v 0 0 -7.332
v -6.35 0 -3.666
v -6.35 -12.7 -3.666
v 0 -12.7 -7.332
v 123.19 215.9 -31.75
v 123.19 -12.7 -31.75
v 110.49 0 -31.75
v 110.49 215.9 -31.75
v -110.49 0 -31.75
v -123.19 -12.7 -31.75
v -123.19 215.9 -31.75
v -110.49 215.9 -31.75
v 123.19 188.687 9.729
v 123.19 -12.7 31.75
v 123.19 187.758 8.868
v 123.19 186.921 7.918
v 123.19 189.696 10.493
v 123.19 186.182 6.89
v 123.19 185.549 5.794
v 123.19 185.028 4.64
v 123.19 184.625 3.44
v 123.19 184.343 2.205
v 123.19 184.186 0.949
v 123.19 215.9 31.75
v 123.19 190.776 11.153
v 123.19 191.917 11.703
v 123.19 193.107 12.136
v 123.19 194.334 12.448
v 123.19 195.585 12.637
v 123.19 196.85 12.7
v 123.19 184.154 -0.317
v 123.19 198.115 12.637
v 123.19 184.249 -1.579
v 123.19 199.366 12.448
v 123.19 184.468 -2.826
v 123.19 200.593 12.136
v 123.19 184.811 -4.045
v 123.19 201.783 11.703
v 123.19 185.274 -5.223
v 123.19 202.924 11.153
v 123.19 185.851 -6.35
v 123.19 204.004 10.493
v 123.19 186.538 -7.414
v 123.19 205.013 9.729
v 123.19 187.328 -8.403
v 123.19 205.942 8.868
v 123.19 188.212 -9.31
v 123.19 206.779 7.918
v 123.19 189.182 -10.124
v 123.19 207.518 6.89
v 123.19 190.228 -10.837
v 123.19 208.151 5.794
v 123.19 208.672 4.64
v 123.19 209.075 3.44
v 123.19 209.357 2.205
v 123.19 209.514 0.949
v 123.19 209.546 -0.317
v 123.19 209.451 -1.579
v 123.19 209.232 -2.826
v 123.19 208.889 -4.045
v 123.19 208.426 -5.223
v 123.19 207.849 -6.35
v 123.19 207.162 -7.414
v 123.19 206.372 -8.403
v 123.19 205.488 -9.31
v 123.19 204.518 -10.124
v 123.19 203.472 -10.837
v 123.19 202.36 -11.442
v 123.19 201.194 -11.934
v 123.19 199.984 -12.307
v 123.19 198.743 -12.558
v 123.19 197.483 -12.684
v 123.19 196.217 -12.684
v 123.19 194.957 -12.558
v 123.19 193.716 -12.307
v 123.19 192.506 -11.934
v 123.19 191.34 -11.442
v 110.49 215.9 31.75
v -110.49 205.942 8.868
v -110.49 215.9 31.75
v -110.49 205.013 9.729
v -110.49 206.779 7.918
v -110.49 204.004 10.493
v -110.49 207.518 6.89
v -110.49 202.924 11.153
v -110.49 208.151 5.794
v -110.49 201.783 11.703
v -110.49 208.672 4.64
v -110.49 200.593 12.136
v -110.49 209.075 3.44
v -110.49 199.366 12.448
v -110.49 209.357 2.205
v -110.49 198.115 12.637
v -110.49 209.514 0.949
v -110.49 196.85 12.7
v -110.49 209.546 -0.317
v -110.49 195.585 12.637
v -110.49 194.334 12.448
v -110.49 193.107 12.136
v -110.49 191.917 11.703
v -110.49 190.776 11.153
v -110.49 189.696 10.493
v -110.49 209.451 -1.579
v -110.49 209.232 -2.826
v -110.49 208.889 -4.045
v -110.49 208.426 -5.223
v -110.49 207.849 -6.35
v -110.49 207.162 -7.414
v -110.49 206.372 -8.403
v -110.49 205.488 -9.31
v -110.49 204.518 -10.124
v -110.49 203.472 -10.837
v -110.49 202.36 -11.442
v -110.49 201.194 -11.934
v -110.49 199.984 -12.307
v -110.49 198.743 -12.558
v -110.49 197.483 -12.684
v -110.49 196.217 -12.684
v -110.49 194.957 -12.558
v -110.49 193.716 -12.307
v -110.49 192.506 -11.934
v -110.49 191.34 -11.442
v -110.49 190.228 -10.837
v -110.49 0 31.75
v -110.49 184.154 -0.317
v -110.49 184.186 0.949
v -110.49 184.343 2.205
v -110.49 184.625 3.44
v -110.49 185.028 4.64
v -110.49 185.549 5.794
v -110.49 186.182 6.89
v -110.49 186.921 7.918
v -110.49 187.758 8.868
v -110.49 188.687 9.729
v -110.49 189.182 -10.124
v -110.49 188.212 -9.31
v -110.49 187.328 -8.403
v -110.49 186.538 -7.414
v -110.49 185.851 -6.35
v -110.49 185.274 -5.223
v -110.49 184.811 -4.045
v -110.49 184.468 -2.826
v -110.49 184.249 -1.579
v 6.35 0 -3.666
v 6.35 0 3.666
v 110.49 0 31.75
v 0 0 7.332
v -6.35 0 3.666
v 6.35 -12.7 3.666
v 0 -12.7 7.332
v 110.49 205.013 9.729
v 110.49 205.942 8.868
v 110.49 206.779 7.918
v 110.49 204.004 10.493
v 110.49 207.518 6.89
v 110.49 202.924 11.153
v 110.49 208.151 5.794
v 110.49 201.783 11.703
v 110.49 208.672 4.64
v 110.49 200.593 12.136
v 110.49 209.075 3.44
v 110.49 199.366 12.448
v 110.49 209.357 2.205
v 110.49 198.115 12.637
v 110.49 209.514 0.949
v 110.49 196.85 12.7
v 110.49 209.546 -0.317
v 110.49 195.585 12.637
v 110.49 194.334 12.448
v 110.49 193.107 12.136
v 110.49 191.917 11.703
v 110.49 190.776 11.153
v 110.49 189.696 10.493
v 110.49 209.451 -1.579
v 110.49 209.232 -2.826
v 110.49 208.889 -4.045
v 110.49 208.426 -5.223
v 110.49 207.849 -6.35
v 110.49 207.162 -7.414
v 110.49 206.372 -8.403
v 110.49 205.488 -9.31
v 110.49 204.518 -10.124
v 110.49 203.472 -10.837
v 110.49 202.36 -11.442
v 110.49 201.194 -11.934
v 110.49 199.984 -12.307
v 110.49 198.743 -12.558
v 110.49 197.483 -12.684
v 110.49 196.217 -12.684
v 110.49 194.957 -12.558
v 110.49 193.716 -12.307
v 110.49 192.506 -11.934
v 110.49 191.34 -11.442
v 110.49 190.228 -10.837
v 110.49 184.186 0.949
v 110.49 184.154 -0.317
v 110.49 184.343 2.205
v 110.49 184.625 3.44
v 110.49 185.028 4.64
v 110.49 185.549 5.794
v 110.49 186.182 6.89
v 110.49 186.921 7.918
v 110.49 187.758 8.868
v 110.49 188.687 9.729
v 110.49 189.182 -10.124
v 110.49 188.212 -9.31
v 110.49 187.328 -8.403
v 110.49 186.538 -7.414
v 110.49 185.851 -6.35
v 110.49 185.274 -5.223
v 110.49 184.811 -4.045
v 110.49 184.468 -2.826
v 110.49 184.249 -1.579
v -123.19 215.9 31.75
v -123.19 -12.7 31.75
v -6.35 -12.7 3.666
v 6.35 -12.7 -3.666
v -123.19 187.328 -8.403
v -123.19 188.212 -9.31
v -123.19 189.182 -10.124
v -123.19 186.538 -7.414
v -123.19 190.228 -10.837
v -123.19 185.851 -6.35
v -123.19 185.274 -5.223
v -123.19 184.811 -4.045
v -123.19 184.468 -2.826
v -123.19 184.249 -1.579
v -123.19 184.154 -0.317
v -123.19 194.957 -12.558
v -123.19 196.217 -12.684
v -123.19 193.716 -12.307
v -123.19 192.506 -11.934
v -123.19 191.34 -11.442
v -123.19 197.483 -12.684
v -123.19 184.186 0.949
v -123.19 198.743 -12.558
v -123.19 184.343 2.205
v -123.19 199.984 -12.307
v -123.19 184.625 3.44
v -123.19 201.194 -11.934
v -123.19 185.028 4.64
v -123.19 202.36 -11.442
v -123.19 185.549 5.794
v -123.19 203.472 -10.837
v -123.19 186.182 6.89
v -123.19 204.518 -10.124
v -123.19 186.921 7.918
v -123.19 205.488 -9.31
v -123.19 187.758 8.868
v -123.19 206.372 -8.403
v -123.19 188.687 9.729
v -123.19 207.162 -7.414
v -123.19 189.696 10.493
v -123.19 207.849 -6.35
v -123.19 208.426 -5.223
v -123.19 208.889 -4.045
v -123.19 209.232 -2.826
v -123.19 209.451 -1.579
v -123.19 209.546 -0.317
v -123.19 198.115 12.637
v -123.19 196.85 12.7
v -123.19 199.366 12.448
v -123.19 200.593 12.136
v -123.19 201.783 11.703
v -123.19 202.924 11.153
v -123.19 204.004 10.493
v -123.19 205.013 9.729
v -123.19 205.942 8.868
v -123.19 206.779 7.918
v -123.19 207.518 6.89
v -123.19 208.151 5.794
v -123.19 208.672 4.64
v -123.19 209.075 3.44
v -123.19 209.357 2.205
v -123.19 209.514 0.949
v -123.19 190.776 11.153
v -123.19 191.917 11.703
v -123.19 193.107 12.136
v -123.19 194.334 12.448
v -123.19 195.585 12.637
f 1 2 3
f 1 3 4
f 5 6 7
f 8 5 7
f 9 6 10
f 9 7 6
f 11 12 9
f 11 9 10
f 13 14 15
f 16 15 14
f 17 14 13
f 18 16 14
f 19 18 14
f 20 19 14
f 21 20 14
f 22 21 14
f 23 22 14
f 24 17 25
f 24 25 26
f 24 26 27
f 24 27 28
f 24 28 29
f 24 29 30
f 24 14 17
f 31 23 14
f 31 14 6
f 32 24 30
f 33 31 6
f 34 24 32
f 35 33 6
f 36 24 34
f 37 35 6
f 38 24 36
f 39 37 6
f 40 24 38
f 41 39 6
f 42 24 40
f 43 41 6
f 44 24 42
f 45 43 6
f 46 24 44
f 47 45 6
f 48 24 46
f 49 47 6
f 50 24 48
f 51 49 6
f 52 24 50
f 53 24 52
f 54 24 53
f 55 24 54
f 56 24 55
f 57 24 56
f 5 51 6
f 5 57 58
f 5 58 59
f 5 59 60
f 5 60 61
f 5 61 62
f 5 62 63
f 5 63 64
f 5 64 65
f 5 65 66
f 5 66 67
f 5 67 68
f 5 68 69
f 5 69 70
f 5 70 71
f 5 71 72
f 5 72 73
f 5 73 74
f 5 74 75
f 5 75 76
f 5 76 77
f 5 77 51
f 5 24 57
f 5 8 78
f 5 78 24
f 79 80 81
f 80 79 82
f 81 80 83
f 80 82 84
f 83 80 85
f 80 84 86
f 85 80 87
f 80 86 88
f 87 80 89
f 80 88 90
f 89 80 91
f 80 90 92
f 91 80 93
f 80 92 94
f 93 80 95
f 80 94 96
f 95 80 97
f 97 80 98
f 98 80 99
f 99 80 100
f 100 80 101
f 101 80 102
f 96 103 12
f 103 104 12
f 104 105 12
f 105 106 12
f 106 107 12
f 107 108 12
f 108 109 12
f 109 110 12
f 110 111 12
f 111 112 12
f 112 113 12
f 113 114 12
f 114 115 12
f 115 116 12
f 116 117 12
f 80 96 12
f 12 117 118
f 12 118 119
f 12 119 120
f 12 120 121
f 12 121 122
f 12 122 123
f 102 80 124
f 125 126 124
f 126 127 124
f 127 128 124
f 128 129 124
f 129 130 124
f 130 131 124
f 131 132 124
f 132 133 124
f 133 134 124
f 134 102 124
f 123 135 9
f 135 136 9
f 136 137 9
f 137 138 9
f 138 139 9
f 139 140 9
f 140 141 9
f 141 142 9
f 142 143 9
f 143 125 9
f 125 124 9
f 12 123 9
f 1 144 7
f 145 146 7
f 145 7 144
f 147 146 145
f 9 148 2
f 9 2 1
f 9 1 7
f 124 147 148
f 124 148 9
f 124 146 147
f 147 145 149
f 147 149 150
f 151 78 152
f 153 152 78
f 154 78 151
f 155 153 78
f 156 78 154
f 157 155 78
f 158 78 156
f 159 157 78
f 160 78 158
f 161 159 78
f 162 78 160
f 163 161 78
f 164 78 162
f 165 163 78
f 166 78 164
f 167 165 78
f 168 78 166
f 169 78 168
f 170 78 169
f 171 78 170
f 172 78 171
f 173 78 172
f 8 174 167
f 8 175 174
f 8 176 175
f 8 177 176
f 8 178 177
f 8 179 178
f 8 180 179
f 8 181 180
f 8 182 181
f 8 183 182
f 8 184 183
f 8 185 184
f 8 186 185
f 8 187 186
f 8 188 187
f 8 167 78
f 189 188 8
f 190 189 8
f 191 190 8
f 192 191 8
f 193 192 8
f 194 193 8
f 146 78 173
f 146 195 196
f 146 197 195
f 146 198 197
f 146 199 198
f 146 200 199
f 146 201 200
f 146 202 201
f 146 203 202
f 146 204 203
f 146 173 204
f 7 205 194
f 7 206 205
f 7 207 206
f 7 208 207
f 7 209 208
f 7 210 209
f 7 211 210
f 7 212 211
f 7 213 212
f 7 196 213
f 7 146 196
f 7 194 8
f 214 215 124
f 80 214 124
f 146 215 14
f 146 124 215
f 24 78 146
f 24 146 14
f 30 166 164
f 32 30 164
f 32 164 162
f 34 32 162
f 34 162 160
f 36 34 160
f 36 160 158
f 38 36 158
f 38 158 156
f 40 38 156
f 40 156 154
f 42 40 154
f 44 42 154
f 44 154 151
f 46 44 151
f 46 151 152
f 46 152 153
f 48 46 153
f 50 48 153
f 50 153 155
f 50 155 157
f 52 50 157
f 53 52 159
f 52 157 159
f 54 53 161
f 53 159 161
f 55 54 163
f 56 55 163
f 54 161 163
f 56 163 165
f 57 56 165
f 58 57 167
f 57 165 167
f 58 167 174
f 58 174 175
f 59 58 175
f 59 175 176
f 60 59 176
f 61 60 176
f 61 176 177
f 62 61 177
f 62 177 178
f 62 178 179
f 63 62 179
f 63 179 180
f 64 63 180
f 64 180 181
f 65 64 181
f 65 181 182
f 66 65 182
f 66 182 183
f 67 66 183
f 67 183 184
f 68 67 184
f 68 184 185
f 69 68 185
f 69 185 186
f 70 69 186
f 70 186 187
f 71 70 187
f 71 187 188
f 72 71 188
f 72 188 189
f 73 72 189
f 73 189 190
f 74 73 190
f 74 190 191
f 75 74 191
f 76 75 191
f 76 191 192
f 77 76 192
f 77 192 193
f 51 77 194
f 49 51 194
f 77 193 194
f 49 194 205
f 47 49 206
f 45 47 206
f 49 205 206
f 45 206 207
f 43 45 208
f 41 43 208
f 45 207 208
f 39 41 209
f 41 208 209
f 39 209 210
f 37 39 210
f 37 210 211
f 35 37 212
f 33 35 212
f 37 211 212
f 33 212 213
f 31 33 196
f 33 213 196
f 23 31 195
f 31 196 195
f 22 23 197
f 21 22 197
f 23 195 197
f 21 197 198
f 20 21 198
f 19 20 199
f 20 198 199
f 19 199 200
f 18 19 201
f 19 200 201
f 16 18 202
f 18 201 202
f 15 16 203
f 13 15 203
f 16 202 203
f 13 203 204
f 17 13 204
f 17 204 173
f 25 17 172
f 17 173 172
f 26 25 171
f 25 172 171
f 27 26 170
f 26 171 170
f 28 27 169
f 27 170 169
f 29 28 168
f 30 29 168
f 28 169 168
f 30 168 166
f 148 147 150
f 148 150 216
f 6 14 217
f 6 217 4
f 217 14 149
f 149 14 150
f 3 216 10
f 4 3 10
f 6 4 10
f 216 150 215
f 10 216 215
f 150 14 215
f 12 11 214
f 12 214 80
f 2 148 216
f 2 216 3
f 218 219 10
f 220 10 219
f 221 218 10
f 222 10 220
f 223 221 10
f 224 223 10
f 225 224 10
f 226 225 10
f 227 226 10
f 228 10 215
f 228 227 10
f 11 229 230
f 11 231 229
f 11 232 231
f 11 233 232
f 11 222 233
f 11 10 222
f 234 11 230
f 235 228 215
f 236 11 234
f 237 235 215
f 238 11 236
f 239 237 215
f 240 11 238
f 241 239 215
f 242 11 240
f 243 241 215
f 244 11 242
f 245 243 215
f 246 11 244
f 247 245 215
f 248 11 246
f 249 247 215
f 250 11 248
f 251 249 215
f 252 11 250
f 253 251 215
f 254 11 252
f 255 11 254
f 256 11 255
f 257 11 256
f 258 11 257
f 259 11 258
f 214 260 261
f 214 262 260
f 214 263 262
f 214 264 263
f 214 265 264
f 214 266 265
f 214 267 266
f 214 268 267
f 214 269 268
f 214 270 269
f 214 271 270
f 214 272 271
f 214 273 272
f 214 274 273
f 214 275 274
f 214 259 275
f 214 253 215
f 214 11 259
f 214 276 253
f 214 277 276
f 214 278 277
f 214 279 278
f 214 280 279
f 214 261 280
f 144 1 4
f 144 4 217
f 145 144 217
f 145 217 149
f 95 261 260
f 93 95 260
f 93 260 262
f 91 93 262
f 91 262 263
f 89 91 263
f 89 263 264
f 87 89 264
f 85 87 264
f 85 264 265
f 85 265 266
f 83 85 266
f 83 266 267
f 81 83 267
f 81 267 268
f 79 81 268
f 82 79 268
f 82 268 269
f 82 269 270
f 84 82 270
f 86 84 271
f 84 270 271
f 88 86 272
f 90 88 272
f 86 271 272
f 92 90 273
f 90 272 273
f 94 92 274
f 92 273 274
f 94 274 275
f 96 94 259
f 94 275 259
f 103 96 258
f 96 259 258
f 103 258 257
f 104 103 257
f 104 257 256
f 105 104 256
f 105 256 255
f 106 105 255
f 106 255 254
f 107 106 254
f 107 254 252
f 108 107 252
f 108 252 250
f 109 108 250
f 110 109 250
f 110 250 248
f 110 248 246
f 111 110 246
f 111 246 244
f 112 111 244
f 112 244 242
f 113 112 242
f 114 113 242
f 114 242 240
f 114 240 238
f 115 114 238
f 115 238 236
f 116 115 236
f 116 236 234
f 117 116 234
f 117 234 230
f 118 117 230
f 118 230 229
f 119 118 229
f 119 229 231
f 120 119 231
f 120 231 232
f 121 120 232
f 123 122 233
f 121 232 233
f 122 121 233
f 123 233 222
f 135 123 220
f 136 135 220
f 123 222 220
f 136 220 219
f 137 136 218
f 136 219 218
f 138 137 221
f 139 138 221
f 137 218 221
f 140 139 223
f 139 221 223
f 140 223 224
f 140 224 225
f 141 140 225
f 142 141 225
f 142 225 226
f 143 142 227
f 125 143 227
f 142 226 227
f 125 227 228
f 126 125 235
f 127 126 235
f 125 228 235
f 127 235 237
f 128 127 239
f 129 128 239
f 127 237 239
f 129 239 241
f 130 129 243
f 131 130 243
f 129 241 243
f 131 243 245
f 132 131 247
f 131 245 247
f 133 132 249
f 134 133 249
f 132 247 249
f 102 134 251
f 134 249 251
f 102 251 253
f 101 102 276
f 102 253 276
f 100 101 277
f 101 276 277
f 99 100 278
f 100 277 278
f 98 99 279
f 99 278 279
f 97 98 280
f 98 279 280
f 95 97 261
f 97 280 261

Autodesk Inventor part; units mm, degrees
ref_plane "YZ Plane" through (0, 0, 0) normal (1, 0, 0) x (0, 1, 0)
ref_plane "XZ Plane" through (0, 0, 0) normal (0, 1, 0) x (-1, 0, 0)
ref_plane "XY Plane" through (0, 0, 0) normal (0, 0, 1) x (1, 0, 0)
sketch "Sketch1" plane through (0, 0, 0) normal (0, 1, 0) x (-1, 0, 0)
  line L0 (123.19, 31.75) -> (-123.19, 31.75)
  line L1 (-123.19, 31.75) -> (-123.19, -31.75)
  line L2 (-123.19, -31.75) -> (123.19, -31.75)
  line L3 (123.19, -31.75) -> (123.19, 31.75)
  line L4 (123.19, 31.75) -> (-123.19, -31.75) construction
  line L5 (-123.19, 31.75) -> (123.19, -31.75) construction
  point P0 (0, 0)
  dimension "d0" = 246.38
  dimension "d1" = 63.5
extrude "Extrusion1" add sketch "Sketch1" against normal blind 12.7
sketch "Sketch2" plane through (0, 0, 0) normal (0, 1, 0) x (1, 0, 0)
  line L0 (-123.19, -31.75) -> (-123.19, 31.75) projected
  line L1 (-123.19, 31.75) -> (123.19, 31.75) projected
  line L2 (-123.19, -31.75) -> (-110.49, -31.75)
  line L3 (-110.49, -31.75) -> (-110.49, 31.75)
  line L4 (-110.49, 31.75) -> (-123.19, 31.75)
  line L5 (-123.19, 31.75) -> (-123.19, -31.75)
  line L6 (123.19, 31.75) -> (123.19, -31.75) projected
  line L7 (123.19, -31.75) -> (110.49, -31.75)
  line L8 (110.49, -31.75) -> (110.49, 31.75)
  line L9 (110.49, 31.75) -> (123.19, 31.75)
  line L10 (123.19, 31.75) -> (123.19, -31.75)
  point P0 (0, 0)
  dimension "d4" = 12.7
  dimension "d5" = 12.7
extrude "Extrusion2" add sketch "Sketch2" along normal blind 215.9
sketch "Sketch3" plane through (-123.19, -12.7, -31.75) normal (-1, 0, 0) x (0, 0, 1)
  line L0 (0, 228.6) -> (63.5, 228.6) construction
  line L1 (31.75, 228.6) -> (31.75, 0) construction
  line L2 (63.5, 0) -> (0, 0) construction
  circle A0 centre (31.75, 209.55) radius 12.7
  line L3 (0, 12.7) -> (0, 228.6) construction
  line L4 (0, 222.25) -> (38.1, 222.25) construction
  point P0 (31.75, 12.7)
  dimension "d8" = 25.4
  dimension "d9" = 6.35
extrude "Extrusion3" cut sketch "Sketch3" against normal through all
sketch "Sketch4" plane through (0, 0, 0) normal (0, 1, 0) x (1, 0, 0)
  line L0 (6.35, 3.6662) -> (6.35, -3.6662)
  line L1 (6.35, -3.6662) -> (0, -7.3323)
  line L2 (0, -7.3323) -> (-6.35, -3.6662)
  line L3 (-6.35, -3.6662) -> (-6.35, 3.6662)
  line L4 (-6.35, 3.6662) -> (0, 7.3323)
  line L5 (0, 7.3323) -> (6.35, 3.6662)
  point P0 (0, 0)
  point P1 (0, 0)
  dimension "d13" = 12.7
extrude "Extrusion4" cut sketch "Sketch4" against normal through all
properties part number "forkV03" material "PBT Plastic"
